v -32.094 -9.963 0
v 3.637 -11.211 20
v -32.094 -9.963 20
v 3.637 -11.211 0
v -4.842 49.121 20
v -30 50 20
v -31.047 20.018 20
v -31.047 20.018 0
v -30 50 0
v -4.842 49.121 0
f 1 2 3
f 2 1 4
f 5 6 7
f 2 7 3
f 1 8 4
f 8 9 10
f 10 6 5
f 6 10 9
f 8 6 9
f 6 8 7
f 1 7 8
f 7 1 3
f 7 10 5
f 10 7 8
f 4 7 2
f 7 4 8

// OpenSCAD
translate([-30,50,0])
scale([3,3,1])
rotate([0,0,-92]) {
    difference() {
        cube([20, 20, 20]);
        translate([10, 0, -1]) {
            rotate([0,0,50]) {
                cube([30, 30, 30]);
            }
        }
    }
}
